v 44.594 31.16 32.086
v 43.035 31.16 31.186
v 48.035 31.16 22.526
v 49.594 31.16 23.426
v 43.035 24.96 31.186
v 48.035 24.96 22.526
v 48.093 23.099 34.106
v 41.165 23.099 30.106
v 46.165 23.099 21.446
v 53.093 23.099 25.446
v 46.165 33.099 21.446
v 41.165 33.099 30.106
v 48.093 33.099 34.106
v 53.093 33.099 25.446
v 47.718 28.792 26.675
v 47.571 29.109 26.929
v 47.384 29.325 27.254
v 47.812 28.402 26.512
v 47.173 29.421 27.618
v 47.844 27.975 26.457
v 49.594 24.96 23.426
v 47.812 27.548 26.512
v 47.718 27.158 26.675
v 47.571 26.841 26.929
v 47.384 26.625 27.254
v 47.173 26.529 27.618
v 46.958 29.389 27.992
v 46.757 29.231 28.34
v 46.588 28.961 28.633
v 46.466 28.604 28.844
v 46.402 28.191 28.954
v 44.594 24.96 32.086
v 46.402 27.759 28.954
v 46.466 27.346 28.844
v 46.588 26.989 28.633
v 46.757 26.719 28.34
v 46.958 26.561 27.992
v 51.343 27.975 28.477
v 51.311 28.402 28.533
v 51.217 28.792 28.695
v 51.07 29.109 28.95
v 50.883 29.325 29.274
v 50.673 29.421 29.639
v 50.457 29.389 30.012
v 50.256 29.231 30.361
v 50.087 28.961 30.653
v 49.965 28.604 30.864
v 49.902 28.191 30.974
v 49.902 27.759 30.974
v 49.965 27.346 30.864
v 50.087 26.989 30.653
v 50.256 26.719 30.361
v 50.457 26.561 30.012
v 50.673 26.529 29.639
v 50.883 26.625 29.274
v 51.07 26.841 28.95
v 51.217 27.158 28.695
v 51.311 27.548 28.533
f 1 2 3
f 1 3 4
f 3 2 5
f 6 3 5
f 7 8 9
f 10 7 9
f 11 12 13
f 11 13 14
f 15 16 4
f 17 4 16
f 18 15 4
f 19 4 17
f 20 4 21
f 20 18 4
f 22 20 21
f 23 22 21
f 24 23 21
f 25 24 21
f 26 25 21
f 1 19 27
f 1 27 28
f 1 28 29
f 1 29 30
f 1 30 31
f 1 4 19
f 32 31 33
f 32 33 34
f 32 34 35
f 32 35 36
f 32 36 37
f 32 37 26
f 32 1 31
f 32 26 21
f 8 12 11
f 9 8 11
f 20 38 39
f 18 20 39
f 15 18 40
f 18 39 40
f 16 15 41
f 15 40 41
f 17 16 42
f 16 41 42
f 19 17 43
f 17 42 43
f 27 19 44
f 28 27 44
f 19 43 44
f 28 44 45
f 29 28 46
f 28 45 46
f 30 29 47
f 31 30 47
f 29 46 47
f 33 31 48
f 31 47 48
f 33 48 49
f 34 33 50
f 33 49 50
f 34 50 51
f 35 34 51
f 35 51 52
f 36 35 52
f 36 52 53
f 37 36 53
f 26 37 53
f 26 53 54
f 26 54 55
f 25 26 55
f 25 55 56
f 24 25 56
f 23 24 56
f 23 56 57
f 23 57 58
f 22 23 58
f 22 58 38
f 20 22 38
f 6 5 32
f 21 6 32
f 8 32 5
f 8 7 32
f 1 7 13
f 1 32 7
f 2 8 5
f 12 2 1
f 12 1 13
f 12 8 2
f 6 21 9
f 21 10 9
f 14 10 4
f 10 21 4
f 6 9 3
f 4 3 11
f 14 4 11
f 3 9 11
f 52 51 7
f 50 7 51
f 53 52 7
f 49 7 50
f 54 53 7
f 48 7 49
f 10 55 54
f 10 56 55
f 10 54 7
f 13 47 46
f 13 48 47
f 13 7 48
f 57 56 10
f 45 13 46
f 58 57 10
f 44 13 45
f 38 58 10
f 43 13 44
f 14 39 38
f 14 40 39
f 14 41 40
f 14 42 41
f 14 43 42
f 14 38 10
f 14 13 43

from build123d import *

# Parameters (mm, degrees)
SKETCH038_W             = 10
SKETCH038_H             = 10
PAD014_DEPTH            = 8
SKETCH039_R             = 1.45
POCKET009_DEPTH         = 5
SKETCH040_W             = 6.2
SKETCH040_H             = 1.8
POCKET010_DEPTH         = 15
BODY014_PLACEMENT_ANGLE = 60


with BuildPart() as part:
    # Sketch038 → Pad014 (new body)
    with BuildSketch(Plane.XY):
        with Locations((0.72243, -0.901424)):
            Rectangle(SKETCH038_W, SKETCH038_H)
    extrude(amount=PAD014_DEPTH)

    # Sketch039 (on Face6 of Pad014) → Pocket009 (cut)
    with BuildSketch(Plane.XY.offset(8)):
        with Locations((0.772802, -1.024983)):
            Circle(SKETCH039_R)
    extrude(amount=-POCKET009_DEPTH, mode=Mode.SUBTRACT)

    # Sketch040 (on Face2 of Pocket009) → Pocket010 (cut)
    with BuildSketch(Plane(origin=(-4.27757, 0, 0), x_dir=(0, -1, 0), z_dir=(-1, 0, 0))):
        with Locations((0.940135, 3.059345)):
            Rectangle(SKETCH040_W, SKETCH040_H)
    extrude(amount=-POCKET010_DEPTH, mode=Mode.SUBTRACT)


with BuildPart() as part_1:
    # Body014 placement: moved
    add(part.part.moved(Location((43.303848, 29, 26.401924))).rotate(Axis((43.303848, 29, 26.401924), (0, 1, 0)), BODY014_PLACEMENT_ANGLE))


solid = part_1.part
